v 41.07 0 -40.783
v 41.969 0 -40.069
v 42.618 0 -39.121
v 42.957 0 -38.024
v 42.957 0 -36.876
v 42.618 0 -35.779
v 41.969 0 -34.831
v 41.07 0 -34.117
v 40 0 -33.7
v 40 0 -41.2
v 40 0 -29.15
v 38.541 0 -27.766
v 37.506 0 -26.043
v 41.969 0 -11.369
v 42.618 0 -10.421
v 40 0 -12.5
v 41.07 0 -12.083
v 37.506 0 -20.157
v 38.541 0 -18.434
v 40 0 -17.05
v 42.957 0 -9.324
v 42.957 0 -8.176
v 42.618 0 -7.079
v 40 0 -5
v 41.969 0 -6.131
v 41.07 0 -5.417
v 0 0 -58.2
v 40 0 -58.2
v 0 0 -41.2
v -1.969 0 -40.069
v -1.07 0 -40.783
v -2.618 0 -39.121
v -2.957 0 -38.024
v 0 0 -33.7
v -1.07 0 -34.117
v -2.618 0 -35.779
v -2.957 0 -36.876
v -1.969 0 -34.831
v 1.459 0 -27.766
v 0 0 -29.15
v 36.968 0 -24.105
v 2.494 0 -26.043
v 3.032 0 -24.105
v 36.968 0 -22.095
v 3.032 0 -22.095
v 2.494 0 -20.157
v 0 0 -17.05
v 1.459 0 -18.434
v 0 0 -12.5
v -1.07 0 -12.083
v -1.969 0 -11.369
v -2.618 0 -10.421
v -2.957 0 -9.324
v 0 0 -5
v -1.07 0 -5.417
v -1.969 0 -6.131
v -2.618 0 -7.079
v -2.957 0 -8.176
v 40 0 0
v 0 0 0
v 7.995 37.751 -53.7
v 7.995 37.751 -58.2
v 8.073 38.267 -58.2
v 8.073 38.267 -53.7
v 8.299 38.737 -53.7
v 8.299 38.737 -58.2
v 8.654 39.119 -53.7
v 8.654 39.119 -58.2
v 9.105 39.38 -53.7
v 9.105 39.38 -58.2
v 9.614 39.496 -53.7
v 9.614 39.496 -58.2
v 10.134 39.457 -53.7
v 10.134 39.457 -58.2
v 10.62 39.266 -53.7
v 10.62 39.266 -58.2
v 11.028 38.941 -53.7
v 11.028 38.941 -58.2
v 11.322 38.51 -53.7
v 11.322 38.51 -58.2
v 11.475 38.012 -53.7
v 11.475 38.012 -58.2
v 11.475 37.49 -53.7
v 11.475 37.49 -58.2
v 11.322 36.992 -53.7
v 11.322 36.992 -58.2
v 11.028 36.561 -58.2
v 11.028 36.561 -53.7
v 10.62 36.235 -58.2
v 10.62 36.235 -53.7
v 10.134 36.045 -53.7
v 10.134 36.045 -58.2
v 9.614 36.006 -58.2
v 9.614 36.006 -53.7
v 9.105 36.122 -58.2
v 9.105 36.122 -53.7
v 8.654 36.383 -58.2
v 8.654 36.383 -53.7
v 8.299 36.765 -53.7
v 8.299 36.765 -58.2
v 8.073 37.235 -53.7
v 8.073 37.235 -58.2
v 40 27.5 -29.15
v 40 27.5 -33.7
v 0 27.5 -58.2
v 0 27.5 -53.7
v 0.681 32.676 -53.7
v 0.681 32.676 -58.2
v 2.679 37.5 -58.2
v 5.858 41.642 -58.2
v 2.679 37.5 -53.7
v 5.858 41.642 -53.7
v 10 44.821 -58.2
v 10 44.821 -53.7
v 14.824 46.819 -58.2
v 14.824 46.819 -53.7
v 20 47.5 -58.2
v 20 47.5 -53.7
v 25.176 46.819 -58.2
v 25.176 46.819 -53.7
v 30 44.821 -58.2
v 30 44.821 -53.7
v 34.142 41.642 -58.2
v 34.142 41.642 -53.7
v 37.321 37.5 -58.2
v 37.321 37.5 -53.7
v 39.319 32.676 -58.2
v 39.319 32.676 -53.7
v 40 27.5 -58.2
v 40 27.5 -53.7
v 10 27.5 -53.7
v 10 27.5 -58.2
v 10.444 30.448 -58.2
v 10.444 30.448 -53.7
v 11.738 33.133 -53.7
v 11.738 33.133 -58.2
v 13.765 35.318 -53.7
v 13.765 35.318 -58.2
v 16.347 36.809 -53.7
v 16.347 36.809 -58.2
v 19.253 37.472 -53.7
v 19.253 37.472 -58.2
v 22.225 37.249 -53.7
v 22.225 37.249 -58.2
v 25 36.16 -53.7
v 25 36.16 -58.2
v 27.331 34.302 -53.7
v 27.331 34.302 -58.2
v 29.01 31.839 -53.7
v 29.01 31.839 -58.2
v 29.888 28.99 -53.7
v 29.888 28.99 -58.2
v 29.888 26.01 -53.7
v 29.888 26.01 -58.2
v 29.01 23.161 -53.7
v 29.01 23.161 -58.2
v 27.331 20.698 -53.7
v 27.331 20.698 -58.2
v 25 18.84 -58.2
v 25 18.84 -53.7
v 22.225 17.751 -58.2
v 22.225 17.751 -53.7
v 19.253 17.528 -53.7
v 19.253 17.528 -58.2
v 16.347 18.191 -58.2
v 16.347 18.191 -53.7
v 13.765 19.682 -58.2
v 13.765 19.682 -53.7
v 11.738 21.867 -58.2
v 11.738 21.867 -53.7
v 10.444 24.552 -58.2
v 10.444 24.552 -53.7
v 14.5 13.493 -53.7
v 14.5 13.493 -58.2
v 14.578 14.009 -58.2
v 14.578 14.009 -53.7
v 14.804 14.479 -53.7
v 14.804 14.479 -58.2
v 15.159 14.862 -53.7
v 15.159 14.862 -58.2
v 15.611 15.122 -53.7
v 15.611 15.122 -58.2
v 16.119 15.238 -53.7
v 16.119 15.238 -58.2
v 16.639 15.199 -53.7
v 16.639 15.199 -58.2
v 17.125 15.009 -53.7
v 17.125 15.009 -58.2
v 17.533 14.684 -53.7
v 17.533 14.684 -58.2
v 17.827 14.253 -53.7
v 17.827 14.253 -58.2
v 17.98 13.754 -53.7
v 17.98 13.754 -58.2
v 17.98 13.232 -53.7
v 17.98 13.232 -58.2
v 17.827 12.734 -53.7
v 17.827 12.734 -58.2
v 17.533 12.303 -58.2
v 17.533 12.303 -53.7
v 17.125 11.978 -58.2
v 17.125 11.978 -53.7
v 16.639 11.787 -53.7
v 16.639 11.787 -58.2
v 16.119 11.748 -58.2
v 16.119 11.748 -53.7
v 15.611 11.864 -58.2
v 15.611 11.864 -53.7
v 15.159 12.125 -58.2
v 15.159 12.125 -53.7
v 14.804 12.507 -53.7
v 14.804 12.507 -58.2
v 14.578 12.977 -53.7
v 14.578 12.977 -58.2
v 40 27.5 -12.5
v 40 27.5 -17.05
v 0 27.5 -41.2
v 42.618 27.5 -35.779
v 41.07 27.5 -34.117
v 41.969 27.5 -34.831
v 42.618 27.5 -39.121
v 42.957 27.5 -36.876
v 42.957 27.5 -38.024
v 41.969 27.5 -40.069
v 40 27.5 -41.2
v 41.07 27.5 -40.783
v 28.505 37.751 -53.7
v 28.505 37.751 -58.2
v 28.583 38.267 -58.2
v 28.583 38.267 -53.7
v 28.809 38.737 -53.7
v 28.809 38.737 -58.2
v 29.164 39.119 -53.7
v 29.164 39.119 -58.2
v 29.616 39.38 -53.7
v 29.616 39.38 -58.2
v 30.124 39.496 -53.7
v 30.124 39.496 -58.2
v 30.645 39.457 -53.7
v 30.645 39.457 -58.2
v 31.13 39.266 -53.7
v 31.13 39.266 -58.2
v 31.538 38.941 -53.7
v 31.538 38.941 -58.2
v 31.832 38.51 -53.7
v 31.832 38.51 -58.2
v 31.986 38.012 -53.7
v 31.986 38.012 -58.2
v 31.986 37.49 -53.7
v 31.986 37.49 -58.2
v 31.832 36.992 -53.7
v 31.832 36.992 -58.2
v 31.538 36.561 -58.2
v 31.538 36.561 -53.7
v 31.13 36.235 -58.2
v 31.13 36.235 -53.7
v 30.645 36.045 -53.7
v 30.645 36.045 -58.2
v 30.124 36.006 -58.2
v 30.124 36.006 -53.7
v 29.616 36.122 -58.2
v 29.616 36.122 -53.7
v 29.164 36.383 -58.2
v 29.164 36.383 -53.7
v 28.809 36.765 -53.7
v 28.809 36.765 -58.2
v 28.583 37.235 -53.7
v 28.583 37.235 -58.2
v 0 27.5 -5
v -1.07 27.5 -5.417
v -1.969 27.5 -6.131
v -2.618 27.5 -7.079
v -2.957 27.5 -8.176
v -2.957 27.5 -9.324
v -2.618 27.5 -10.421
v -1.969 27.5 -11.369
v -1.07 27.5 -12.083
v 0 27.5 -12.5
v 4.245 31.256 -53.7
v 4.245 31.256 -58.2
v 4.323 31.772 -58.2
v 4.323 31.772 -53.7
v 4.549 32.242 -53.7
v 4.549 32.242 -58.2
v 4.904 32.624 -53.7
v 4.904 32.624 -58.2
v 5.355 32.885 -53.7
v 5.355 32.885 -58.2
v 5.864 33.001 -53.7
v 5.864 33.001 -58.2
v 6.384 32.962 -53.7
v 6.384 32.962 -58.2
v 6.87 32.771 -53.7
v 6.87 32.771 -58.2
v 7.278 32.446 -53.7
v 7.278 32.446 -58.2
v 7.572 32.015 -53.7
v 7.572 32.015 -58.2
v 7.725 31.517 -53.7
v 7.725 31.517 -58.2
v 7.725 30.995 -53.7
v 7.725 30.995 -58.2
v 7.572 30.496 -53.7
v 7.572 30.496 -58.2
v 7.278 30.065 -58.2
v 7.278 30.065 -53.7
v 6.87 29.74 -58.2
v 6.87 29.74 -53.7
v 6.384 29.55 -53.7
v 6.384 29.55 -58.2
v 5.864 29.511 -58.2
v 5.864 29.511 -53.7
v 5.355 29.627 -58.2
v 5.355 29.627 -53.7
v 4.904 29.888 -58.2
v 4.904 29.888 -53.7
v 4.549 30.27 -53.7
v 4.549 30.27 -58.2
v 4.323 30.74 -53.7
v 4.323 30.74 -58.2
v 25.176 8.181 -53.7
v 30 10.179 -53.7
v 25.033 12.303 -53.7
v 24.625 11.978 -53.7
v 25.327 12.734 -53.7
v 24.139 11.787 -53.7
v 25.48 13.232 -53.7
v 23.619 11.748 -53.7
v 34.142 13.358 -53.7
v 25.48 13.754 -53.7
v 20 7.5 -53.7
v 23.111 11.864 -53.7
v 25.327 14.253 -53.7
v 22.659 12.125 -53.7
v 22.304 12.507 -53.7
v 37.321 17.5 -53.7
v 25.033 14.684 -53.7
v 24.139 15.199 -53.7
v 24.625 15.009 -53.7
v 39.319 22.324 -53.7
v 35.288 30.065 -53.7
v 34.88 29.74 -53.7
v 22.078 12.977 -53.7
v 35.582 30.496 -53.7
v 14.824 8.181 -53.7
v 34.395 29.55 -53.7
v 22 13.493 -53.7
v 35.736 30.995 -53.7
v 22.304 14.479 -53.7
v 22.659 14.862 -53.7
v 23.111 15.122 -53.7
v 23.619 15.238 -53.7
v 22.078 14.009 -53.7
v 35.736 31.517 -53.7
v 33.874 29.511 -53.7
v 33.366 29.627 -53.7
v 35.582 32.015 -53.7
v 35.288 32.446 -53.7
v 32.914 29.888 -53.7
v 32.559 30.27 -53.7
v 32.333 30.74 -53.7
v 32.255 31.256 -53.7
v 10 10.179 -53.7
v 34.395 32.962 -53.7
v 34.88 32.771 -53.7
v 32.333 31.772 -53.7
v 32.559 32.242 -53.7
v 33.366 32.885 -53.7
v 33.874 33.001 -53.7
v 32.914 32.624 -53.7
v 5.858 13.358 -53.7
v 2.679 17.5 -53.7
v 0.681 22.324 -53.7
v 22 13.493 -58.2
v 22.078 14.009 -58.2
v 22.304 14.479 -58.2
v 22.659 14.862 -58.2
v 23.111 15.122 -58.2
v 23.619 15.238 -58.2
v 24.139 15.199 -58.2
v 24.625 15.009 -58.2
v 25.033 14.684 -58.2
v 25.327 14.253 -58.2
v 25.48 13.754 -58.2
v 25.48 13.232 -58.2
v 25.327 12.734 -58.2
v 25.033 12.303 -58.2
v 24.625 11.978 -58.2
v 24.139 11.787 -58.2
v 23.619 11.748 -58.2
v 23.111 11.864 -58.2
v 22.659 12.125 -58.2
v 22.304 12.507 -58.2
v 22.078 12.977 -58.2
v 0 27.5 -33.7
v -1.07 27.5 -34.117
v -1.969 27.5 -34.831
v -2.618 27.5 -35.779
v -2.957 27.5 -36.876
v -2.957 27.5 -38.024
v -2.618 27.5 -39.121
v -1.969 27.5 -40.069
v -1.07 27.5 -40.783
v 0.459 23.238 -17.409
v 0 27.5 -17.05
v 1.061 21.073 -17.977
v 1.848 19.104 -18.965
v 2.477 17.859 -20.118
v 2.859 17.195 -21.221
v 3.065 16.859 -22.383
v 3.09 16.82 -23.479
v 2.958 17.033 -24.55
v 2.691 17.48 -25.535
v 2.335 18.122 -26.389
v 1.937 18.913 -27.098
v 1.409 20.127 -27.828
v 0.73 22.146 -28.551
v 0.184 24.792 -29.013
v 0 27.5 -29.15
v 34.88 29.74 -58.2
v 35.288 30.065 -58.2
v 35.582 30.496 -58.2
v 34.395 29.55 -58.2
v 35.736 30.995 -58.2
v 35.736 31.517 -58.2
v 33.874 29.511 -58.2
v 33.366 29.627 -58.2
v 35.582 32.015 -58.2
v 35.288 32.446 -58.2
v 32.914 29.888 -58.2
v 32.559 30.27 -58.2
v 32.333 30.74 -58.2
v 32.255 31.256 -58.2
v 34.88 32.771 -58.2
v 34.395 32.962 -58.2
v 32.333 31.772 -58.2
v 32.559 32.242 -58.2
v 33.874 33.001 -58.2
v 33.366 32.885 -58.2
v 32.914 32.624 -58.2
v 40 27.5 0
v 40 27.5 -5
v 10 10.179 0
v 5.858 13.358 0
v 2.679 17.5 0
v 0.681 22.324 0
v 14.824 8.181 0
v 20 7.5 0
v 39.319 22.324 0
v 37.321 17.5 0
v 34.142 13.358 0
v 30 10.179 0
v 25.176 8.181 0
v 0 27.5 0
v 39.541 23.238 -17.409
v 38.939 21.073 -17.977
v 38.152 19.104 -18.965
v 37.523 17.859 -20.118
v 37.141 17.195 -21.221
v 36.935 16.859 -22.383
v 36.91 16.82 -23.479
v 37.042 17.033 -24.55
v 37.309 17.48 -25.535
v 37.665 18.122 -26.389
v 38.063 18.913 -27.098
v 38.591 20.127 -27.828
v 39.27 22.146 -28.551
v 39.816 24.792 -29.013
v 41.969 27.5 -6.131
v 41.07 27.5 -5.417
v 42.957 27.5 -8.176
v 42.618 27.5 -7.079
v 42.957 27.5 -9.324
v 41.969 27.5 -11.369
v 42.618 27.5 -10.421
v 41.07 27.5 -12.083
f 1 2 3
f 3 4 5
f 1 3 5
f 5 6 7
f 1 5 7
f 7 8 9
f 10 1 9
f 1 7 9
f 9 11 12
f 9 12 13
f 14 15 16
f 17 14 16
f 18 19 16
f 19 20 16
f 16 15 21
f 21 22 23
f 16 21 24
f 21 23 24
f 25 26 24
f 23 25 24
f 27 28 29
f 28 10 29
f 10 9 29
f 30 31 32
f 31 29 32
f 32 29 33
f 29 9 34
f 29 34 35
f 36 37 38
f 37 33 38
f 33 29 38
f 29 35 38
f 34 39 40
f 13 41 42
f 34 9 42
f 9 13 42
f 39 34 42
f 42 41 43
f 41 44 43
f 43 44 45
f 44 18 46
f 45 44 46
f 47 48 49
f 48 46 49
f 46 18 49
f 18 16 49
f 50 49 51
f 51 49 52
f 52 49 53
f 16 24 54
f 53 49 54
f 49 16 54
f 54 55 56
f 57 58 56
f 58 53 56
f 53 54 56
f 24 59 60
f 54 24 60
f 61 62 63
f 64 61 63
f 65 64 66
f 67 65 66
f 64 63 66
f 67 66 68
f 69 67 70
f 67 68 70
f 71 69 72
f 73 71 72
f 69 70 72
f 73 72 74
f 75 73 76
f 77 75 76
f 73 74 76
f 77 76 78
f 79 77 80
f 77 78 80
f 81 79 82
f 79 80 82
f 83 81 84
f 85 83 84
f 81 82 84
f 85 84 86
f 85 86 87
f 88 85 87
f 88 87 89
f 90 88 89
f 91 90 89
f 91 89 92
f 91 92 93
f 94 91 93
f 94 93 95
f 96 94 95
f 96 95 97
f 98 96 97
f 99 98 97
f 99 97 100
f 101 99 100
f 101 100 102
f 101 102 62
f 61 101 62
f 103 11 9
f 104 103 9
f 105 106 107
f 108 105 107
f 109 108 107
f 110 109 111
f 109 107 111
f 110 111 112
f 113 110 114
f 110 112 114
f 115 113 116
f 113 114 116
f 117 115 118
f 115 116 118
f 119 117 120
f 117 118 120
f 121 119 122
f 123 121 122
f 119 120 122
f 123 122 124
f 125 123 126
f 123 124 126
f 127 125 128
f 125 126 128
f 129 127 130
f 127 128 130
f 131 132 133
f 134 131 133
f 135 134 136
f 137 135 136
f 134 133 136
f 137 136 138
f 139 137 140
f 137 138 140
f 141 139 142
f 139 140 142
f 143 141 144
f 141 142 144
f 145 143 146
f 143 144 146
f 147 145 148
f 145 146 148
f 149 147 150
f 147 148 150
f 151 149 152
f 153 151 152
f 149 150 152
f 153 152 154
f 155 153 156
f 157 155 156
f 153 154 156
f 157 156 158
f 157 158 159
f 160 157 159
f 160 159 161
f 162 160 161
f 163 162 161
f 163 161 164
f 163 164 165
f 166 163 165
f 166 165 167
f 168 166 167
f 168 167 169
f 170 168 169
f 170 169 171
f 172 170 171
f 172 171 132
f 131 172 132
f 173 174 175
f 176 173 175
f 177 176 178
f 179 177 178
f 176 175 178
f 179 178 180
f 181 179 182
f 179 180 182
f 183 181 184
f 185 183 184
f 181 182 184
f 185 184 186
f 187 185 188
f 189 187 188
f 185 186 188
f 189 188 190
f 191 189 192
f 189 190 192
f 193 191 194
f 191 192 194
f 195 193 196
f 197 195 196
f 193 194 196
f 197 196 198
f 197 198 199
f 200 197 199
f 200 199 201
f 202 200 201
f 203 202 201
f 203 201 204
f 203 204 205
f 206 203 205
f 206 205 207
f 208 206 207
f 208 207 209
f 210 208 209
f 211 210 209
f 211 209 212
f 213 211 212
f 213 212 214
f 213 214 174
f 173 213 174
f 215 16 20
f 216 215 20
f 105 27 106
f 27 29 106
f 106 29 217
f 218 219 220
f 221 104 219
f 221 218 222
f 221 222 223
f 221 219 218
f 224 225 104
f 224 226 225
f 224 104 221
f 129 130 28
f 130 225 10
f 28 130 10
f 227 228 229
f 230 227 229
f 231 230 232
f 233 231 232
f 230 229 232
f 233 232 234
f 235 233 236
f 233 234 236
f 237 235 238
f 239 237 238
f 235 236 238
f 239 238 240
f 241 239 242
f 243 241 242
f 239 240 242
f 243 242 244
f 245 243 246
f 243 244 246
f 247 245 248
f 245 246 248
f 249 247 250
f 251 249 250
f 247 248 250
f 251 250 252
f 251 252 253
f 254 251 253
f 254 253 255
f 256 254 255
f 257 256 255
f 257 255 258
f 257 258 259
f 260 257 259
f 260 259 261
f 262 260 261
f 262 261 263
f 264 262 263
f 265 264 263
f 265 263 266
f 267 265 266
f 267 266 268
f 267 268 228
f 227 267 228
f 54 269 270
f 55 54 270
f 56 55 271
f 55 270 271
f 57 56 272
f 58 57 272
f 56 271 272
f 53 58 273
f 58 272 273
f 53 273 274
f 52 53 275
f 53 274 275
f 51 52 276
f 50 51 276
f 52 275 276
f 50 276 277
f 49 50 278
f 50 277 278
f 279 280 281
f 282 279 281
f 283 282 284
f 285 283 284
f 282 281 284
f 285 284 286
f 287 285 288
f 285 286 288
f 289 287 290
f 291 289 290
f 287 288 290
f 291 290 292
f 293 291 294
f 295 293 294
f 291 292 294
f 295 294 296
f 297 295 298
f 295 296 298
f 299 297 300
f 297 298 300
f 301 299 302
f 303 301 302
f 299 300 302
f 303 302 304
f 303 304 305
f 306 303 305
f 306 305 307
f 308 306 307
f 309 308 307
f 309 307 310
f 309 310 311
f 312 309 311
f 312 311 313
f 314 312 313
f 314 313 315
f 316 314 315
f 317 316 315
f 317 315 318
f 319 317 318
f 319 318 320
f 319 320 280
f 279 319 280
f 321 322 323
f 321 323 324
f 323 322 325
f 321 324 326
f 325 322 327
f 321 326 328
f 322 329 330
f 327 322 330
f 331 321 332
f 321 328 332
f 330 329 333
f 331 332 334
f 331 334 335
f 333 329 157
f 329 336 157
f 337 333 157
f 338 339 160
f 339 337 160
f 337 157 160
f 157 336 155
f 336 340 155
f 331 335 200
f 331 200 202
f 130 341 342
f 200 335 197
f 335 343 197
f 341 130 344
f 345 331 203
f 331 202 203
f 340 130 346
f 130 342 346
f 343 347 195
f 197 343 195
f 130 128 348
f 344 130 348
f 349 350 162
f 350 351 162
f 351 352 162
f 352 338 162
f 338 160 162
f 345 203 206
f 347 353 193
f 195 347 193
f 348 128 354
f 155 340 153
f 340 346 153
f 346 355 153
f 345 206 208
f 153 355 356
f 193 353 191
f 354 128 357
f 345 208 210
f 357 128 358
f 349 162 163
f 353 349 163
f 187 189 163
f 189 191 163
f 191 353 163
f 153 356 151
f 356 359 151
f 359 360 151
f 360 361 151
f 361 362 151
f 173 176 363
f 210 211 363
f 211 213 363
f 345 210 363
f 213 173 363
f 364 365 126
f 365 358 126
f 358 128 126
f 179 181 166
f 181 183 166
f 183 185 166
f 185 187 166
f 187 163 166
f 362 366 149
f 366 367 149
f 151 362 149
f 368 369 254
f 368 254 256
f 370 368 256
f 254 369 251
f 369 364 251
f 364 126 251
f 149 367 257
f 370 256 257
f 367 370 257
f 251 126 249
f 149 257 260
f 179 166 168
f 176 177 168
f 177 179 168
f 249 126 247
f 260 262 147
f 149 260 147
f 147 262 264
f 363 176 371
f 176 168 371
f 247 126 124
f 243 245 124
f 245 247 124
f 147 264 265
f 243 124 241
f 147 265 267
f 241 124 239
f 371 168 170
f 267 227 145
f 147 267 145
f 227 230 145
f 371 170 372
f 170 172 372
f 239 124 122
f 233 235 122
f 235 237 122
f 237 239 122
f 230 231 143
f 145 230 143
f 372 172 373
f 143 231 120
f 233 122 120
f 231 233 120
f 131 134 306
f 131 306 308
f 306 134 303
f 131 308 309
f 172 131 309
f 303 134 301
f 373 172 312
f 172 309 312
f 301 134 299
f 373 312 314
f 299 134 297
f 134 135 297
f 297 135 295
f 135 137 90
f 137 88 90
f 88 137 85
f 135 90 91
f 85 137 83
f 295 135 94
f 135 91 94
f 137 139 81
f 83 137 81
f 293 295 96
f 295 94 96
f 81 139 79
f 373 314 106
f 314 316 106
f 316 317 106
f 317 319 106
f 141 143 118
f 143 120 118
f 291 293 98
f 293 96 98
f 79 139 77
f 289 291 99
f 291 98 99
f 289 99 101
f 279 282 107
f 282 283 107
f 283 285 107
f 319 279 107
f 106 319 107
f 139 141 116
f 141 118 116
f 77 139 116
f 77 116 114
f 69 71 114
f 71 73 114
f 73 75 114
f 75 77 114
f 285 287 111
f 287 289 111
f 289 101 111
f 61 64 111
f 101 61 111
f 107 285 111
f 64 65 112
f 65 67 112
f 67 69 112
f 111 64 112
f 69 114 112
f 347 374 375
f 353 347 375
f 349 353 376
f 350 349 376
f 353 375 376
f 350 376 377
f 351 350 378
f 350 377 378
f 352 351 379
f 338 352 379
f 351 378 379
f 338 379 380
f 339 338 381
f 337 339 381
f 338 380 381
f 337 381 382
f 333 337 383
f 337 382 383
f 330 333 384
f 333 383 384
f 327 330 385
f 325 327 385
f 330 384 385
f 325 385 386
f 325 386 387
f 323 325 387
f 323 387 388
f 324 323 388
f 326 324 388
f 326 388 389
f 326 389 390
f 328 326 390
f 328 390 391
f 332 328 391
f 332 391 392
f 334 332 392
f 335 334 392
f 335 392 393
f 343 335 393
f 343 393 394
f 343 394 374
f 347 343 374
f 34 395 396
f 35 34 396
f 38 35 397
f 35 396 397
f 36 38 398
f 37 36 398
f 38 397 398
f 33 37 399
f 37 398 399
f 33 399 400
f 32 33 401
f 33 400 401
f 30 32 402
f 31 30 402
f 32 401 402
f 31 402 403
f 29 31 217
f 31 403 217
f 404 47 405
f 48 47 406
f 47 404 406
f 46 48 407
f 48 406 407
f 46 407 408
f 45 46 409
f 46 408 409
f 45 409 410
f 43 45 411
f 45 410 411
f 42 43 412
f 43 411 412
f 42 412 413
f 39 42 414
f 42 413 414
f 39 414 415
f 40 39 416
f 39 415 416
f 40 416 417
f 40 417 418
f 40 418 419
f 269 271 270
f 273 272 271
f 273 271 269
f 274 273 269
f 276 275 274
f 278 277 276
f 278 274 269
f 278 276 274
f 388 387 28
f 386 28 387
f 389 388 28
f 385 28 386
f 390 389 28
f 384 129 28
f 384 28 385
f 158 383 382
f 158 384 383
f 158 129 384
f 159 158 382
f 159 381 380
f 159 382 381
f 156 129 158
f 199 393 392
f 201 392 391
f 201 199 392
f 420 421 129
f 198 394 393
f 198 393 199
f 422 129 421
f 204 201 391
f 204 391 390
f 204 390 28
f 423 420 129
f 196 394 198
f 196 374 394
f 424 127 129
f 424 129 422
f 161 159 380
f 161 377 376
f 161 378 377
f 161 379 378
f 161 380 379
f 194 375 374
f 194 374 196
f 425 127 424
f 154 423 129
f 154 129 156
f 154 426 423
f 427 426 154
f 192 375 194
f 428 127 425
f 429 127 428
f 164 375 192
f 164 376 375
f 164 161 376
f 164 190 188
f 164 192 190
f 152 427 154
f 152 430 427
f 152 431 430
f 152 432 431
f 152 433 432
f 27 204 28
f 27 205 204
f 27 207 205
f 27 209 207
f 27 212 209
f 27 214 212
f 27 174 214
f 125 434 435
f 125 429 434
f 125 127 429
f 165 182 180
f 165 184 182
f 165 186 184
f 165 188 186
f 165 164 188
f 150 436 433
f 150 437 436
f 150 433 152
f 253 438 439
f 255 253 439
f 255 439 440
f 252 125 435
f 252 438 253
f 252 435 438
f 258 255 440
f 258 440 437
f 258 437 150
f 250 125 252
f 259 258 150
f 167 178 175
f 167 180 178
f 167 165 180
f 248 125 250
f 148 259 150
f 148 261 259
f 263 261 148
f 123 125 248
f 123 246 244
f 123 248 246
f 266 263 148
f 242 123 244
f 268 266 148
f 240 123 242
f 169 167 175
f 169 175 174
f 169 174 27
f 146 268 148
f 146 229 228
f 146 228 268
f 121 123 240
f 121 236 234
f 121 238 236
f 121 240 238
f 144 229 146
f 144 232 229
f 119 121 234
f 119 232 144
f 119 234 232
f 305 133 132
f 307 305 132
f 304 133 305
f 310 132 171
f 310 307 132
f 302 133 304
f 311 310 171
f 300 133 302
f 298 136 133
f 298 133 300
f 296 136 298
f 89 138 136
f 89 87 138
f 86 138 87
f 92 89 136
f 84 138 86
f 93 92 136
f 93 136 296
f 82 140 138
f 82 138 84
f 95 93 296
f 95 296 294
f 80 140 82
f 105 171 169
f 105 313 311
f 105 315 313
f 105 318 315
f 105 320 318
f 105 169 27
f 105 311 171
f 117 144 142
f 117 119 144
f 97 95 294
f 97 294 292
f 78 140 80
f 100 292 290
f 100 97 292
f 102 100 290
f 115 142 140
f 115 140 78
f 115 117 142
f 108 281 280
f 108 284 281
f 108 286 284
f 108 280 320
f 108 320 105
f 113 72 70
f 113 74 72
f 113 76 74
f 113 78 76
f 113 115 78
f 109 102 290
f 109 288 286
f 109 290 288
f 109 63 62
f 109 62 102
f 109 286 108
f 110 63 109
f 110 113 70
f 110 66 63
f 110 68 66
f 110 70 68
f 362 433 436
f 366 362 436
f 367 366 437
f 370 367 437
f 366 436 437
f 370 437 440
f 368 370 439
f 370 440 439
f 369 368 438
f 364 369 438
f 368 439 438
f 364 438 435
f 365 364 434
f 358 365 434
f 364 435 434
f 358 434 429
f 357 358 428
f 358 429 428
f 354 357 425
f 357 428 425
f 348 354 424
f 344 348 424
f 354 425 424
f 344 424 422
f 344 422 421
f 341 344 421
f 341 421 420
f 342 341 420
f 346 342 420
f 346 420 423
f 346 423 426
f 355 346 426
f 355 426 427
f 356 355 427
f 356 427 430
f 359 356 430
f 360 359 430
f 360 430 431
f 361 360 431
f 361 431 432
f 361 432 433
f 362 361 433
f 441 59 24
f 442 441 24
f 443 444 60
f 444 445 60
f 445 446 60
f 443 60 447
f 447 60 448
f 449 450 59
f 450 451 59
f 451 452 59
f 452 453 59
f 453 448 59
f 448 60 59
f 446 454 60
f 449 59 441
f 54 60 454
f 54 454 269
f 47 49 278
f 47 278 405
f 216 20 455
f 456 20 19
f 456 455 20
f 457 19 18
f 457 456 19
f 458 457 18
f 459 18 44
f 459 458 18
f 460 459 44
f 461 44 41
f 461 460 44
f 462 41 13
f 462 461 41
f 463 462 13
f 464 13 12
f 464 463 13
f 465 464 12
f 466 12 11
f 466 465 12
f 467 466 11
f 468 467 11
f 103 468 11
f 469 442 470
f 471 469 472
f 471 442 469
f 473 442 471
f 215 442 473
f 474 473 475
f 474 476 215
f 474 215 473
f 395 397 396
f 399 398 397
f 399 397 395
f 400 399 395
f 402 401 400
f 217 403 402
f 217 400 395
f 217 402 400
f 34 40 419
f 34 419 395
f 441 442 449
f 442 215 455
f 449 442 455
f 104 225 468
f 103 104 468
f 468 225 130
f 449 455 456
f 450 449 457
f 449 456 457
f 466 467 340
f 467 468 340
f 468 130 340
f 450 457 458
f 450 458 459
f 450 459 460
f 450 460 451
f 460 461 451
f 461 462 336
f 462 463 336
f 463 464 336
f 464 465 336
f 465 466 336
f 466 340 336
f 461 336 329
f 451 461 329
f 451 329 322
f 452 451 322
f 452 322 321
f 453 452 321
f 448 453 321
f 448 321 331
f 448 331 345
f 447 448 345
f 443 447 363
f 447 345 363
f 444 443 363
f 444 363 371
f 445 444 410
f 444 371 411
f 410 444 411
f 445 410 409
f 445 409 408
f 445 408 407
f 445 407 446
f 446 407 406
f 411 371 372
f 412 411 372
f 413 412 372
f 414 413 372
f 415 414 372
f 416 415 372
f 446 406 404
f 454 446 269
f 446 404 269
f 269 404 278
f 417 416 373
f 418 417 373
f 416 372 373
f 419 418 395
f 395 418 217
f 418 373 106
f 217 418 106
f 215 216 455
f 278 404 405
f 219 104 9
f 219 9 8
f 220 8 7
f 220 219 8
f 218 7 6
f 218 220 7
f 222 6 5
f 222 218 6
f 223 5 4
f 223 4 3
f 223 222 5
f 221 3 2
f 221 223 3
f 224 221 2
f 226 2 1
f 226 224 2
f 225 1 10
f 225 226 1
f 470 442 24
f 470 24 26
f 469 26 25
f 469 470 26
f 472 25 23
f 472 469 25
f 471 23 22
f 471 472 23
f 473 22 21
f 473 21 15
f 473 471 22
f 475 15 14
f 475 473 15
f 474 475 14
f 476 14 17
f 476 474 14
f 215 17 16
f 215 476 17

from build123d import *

# Parameters (mm, degrees)
SKETCH3_W           = 40
SKETCH3_H           = 53.7
BOSS_EXTRUDE1_DEPTH = 27.5
BOSS_EXTRUDE4_DEPTH = 27.5
CUT_EXTRUDE1_DEPTH  = 28.5
SKETCH7_R           = 20
CUT_EXTRUDE2_DEPTH  = 54.7
BOSS_EXTRUDE5_DEPTH = 4.5
SKETCH9_R           = 10
CUT_EXTRUDE3_DEPTH  = 59.2000001
SKETCH10_R          = 1.75
CUT_EXTRUDE4_DEPTH  = 59.2000001


with BuildPart() as part:
    # Sketch3 → Boss-Extrude1 (new body)
    with BuildSketch(Plane(origin=(0, 0, 0), x_dir=(1, 0, 0), z_dir=(0, 1, 0))):
        with Locations((20, 26.85)):
            Rectangle(SKETCH3_W, SKETCH3_H)
    extrude(amount=BOSS_EXTRUDE1_DEPTH)

    # Sketch4 → Boss-Extrude4 (add)
    with BuildSketch(Plane(origin=(0, 27.5, 0), x_dir=(1, 0, 0), z_dir=(0, 1, 0))):
        with BuildLine():
            Line((0, 41.2), (0, 33.7))
            ThreePointArc((0, 33.7), (-2.999999474, 37.45), (0, 41.2))
        make_face()
        with BuildLine():
            Line((0, 12.5), (0, 5))
            ThreePointArc((0, 5), (-2.999999474, 8.75), (0, 12.5))
        make_face()
        with BuildLine():
            Line((40, 41.2), (40, 33.7))
            ThreePointArc((40, 33.7), (42.999999474, 37.45), (40, 41.2))
        make_face()
        with BuildLine():
            Line((40, 12.5), (40, 5))
            ThreePointArc((40, 5), (42.999999474, 8.75), (40, 12.5))
        make_face()
    extrude(amount=-BOSS_EXTRUDE4_DEPTH)

    # Sketch6 → Cut-Extrude1 (cut, through all)
    with BuildSketch(Plane(origin=(0, 27.5, 0), x_dir=(1, 0, 0), z_dir=(0, 1, 0))):
        with BuildLine():
            Line((0, 29.15), (0, 17.05))
            ThreePointArc((0, 17.05), (3.100001365, 23.1), (0, 29.15))
        make_face()
        with BuildLine():
            Line((40, 29.15), (40, 17.05))
            ThreePointArc((40, 17.05), (36.899998635, 23.1), (40, 29.15))
        make_face()
    extrude(amount=-CUT_EXTRUDE1_DEPTH, mode=Mode.SUBTRACT)

    # Sketch7 → Cut-Extrude2 (cut, through all)
    with BuildSketch(Plane(origin=(0, 0, -53.7), x_dir=(-1, 0, 0), z_dir=(0, 0, -1))):
        with Locations((-20, 27.5)):
            Circle(SKETCH7_R)
    extrude(amount=-CUT_EXTRUDE2_DEPTH, mode=Mode.SUBTRACT)

    # Sketch8 → Boss-Extrude5 (add)
    with BuildSketch(Plane(origin=(0, 0, -53.7), x_dir=(-1, 0, 0), z_dir=(0, 0, -1))):
        with BuildLine():
            Line((-40, 27.5), (-40, 0))
            Line((-40, 0), (0, 0))
            Line((0, 0), (0, 27.5))
            ThreePointArc((0, 27.5), (-20, 47.5), (-40, 27.5))
        make_face()
    extrude(amount=BOSS_EXTRUDE5_DEPTH)

    # Sketch9 → Cut-Extrude3 (cut, through all)
    with BuildSketch(Plane(origin=(0, 0, -58.2), x_dir=(-1, 0, 0), z_dir=(0, 0, -1))):
        with Locations((-20, 27.5)):
            Circle(SKETCH9_R)
    extrude(amount=-CUT_EXTRUDE3_DEPTH, mode=Mode.SUBTRACT)

    # Sketch10 → Cut-Extrude4 (cut, through all)
    with BuildSketch(Plane(origin=(0, 0, -58.2), x_dir=(-1, 0, 0), z_dir=(0, 0, -1))):
        with Locations((-23.75, 13.493305172)):
            Circle(SKETCH10_R)
        with Locations((-16.25, 13.493305172)):
            Circle(SKETCH10_R)
        with Locations((-34.005153544, 31.25575215)):
            Circle(SKETCH10_R)
        with Locations((-30.255153544, 37.750942678)):
            Circle(SKETCH10_R)
        with Locations((-9.744846456, 37.750942678)):
            Circle(SKETCH10_R)
        with Locations((-5.994846456, 31.25575215)):
            Circle(SKETCH10_R)
    extrude(amount=-CUT_EXTRUDE4_DEPTH, mode=Mode.SUBTRACT)


solid = part.part
